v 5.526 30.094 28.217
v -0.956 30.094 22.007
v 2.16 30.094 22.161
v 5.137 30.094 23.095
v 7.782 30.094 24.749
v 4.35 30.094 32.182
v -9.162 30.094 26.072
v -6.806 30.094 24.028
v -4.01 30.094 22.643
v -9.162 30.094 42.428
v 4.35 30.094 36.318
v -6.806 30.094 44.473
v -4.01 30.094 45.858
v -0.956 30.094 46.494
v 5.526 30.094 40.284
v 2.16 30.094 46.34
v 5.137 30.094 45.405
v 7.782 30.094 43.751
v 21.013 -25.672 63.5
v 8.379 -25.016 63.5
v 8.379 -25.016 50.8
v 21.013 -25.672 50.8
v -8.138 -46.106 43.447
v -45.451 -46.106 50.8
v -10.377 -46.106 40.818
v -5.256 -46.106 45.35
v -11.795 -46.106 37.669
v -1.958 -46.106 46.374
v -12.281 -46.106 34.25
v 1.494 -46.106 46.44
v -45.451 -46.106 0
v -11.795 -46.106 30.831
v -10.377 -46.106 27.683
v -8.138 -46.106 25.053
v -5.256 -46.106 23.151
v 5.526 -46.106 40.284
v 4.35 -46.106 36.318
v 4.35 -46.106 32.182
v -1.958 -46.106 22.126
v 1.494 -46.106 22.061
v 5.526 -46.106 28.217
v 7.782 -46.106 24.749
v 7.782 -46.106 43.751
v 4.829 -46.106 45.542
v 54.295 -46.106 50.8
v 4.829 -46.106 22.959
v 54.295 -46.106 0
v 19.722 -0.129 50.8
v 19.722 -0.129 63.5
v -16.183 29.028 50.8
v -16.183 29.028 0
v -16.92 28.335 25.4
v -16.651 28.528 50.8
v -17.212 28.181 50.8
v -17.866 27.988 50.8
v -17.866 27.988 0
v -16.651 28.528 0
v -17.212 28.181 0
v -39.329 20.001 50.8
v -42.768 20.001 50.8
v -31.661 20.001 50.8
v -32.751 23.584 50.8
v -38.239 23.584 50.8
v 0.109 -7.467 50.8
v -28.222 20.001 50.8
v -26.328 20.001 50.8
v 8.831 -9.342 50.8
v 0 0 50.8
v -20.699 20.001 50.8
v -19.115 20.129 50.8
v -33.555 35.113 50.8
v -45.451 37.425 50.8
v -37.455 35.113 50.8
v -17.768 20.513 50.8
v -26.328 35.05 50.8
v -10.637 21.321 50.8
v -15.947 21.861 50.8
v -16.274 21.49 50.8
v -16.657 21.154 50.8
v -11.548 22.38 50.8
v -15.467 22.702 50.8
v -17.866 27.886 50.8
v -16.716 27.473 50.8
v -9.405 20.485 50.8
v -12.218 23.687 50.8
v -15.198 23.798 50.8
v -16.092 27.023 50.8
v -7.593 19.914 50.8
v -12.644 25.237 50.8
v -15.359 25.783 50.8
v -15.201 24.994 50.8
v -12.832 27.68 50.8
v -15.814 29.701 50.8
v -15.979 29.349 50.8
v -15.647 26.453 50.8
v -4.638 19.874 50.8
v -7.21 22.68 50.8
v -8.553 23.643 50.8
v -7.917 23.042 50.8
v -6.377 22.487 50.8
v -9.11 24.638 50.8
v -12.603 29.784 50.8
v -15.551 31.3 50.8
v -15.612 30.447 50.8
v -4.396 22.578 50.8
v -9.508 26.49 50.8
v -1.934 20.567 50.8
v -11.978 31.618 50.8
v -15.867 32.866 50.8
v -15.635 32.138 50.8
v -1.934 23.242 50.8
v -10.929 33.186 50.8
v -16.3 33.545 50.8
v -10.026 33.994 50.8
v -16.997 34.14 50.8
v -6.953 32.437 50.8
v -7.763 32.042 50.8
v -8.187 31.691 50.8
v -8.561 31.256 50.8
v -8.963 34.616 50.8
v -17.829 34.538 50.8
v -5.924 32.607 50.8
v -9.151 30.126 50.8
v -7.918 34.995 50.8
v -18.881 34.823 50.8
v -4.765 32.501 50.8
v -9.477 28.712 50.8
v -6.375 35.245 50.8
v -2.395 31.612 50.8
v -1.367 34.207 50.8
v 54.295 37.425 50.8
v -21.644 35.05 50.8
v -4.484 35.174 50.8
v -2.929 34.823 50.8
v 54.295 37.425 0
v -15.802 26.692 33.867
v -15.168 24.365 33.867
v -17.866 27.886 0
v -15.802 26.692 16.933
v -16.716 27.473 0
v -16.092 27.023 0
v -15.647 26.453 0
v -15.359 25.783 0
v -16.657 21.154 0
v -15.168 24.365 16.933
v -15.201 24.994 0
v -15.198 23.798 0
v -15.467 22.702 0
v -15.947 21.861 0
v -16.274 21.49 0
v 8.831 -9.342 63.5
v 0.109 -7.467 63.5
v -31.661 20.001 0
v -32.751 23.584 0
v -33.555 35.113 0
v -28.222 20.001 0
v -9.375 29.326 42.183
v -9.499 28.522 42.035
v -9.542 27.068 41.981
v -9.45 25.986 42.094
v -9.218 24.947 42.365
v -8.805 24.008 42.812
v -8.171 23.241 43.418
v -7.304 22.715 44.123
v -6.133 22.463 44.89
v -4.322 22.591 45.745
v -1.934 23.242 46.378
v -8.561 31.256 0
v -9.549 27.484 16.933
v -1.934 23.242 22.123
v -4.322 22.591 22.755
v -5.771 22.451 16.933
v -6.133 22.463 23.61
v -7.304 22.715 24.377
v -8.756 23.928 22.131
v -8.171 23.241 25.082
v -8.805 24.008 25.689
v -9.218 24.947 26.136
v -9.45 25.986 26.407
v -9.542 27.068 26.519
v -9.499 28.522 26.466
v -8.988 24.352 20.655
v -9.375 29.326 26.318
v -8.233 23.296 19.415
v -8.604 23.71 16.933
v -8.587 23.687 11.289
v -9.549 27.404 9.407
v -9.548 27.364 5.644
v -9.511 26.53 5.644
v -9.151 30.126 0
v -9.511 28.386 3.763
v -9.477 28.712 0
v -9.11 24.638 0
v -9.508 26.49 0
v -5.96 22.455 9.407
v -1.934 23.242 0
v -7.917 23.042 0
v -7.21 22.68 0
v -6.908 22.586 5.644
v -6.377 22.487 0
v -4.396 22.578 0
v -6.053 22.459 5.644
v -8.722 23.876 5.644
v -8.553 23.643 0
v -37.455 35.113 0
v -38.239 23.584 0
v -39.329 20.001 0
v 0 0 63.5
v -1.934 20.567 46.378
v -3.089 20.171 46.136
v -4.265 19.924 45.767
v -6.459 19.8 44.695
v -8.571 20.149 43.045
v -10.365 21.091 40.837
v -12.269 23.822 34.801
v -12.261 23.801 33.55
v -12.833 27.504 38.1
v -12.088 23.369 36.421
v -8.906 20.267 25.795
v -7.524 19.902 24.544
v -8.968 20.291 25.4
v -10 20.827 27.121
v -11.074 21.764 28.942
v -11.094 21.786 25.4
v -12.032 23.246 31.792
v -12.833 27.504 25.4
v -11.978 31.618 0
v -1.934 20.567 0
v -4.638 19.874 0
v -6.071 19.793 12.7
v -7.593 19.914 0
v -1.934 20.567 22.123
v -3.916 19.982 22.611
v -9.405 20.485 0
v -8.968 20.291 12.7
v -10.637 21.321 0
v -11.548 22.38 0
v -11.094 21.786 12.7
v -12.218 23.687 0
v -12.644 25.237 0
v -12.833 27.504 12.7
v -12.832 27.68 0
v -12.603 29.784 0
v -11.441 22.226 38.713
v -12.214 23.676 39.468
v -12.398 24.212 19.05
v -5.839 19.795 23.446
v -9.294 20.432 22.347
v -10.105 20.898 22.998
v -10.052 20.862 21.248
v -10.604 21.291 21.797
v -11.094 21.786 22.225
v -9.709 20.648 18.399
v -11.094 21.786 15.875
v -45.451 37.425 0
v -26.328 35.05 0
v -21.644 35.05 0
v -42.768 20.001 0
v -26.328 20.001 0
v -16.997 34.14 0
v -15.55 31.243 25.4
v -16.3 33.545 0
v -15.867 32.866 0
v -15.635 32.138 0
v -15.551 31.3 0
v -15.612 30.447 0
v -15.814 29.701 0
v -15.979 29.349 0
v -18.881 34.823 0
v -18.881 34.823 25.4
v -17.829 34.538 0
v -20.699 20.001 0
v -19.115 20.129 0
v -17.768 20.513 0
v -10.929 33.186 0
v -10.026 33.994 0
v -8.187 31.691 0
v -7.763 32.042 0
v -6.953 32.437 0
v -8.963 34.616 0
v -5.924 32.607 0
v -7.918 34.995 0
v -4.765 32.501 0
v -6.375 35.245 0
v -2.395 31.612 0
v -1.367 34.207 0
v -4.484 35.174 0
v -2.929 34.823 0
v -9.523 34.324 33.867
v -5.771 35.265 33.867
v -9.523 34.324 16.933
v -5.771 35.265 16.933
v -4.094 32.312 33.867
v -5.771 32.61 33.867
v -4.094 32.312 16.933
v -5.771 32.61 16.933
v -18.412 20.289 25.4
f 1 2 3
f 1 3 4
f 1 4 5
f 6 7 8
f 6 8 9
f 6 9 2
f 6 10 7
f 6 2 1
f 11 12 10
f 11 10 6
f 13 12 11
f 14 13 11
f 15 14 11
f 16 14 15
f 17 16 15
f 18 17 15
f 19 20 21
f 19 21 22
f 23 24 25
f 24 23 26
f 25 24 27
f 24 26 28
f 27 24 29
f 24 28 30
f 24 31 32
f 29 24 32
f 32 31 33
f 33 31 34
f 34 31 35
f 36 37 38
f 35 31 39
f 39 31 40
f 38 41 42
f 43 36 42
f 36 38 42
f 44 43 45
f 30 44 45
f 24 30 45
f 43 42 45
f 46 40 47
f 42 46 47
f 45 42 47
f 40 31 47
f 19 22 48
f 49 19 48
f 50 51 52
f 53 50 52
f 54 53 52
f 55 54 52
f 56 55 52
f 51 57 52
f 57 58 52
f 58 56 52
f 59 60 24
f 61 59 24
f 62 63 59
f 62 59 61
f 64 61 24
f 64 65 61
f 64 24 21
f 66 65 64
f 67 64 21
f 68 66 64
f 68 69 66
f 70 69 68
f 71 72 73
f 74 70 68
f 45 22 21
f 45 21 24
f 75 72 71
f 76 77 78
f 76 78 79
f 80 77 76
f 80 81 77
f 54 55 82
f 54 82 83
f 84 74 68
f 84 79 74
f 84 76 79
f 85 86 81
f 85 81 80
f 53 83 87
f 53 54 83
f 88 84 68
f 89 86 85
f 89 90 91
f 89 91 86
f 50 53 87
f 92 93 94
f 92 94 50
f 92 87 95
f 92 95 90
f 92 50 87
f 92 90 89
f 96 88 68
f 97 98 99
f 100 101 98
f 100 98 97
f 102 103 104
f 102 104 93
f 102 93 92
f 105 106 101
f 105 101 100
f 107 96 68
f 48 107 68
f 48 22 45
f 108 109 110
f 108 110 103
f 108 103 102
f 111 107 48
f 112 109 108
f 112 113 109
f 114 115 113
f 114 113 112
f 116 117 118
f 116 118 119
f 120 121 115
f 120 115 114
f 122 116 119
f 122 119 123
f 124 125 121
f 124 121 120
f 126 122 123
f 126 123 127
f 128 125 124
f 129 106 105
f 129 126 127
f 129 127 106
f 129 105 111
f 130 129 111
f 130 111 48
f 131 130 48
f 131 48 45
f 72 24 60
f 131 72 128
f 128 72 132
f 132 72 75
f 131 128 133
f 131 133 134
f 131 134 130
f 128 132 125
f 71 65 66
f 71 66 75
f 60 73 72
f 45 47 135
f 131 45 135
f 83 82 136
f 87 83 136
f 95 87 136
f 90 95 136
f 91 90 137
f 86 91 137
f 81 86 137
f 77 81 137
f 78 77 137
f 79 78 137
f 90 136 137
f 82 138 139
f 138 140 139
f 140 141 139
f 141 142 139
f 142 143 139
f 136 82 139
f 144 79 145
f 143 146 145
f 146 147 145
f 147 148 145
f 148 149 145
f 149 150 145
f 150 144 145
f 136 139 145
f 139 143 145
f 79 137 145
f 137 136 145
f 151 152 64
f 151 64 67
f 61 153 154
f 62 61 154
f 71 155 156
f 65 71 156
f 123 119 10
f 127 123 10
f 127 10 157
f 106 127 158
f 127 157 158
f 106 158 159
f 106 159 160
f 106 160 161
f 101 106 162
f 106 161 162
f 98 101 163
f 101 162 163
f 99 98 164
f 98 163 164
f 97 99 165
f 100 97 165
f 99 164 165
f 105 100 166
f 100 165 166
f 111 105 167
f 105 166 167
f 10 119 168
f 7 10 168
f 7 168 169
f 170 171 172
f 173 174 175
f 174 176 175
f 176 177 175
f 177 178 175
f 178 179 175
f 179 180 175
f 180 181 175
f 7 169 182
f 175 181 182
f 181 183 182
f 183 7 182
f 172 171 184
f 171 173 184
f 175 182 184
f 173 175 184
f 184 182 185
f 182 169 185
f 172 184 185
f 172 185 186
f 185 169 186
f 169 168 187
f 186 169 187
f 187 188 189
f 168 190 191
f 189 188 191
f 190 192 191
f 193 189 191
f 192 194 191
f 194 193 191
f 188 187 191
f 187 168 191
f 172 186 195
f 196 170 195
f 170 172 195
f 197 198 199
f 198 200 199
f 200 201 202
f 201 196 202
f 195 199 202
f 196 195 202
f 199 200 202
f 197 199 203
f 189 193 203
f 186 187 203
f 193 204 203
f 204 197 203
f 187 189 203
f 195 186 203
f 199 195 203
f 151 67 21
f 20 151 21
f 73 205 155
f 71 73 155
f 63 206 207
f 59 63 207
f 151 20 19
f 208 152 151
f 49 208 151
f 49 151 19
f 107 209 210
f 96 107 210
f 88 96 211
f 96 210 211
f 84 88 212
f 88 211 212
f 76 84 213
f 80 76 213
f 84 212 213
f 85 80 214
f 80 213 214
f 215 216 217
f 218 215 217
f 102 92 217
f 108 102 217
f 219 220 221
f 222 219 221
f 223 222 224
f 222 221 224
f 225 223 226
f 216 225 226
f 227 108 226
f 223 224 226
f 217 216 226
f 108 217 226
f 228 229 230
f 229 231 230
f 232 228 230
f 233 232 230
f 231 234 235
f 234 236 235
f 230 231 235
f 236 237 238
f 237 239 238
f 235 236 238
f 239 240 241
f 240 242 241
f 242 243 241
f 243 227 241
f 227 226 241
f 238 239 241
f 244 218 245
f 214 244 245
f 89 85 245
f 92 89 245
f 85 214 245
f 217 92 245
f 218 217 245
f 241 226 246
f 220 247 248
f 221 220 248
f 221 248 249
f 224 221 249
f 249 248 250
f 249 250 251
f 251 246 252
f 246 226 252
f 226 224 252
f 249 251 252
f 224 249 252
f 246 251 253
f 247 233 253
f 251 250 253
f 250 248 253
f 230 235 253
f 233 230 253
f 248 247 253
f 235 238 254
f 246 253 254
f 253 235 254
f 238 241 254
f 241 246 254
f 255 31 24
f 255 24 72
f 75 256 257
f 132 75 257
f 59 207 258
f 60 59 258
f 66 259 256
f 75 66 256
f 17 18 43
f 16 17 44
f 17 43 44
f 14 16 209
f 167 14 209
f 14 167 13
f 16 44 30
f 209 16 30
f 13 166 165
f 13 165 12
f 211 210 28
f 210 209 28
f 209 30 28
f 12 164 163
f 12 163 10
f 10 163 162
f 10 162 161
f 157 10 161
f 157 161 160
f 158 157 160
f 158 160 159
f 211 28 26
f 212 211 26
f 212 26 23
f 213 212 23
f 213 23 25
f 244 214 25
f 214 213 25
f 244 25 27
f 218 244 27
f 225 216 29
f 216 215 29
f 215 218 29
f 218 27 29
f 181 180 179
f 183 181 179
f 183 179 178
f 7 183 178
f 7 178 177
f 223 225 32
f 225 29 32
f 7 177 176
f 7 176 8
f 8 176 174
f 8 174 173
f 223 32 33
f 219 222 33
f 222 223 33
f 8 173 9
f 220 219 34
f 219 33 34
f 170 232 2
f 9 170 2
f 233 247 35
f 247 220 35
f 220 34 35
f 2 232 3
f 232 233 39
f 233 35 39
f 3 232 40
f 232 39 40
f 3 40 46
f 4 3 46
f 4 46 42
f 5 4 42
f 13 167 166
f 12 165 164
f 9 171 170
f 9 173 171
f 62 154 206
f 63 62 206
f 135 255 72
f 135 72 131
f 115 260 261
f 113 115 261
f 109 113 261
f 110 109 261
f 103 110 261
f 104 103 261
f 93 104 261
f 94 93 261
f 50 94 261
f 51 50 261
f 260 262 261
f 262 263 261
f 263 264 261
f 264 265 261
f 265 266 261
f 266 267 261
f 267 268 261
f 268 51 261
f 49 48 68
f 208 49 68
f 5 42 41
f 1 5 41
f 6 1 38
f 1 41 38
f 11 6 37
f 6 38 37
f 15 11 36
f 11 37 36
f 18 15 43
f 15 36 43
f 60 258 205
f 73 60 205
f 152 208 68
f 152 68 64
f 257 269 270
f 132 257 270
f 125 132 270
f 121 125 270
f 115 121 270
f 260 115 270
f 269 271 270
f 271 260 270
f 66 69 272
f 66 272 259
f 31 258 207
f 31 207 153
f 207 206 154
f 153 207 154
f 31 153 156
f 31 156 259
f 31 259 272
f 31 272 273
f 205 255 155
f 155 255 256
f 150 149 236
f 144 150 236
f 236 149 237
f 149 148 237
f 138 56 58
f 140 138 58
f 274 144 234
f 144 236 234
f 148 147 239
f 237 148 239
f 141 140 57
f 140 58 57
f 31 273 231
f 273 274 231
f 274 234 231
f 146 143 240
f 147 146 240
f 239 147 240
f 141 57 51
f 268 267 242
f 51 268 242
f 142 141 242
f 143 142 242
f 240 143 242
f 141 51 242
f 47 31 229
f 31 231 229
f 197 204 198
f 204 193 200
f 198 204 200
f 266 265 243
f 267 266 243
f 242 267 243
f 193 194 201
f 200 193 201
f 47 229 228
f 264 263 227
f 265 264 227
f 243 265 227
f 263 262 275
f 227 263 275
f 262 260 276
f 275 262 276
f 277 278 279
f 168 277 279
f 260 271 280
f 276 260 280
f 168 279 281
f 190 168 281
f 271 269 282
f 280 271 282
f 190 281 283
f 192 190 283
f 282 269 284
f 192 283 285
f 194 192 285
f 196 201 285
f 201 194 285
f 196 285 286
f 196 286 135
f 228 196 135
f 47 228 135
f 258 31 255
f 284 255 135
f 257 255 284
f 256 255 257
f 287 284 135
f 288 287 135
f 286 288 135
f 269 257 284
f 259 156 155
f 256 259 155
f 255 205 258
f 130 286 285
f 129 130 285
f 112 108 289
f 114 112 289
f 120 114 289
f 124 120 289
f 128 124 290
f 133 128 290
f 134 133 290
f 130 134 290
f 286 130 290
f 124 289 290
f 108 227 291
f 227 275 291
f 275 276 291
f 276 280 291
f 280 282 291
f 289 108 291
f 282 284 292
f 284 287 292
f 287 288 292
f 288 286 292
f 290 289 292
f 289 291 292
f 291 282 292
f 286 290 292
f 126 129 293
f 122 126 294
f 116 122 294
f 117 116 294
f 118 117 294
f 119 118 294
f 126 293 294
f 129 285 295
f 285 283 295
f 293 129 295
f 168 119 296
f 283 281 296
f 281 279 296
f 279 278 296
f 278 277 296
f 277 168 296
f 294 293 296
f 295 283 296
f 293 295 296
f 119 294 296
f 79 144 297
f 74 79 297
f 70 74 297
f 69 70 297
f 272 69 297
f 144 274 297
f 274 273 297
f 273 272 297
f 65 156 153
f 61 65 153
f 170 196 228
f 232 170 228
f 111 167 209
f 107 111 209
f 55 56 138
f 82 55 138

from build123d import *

# Parameters (mm, degrees)
F0_W     = 99.7463464737
F0_H     = 83.5314244032
F1_DEPTH = 50.8
F3_DEPTH = 76.2
F5_DEPTH = 12.7


with BuildPart() as f1:
    # F0 (on Top) → F1 (new body)
    with BuildSketch(Plane.XY):
        with Locations((4.4222511351, -4.3403580785)):
            Rectangle(F0_W, F0_H)
        Polygon((-28.2221282138, 20.0006692662), (-31.6609589625, 20.0006692662), (-32.7512395926, 23.5844315791), (-38.2388756342, 23.5844315791), (-39.3291562643, 20.0006692662), (-42.767987013, 20.0006692662), (-37.4549276283, 35.1130787253), (-33.5549509937, 35.1130787253), align=None, mode=Mode.SUBTRACT)
        with BuildLine():
            Line((-26.3281361826, 20.0006692662), (-26.3281361826, 35.0504946407))
            Line((-26.3281361826, 35.0504946407), (-21.6442115421, 35.0504946407))
            add(Edge.make_bspline(
                [(-21.6442115421, 35.0504946407), (-18.4425415347, 35.0504946407), (-16.9965197926, 34.1397315162)],
                knots=[0, 0, 0, 1, 1, 1], degree=2))
            add(Edge.make_bspline(
                [(-16.9965197926, 34.1397315162), (-15.5504980506, 33.2289683917), (-15.5504980506, 31.2427471833)],
                knots=[0, 0, 0, 1, 1, 1], degree=2))
            add(Edge.make_bspline(
                [(-15.5504980506, 31.2427471833), (-15.5504980506, 29.8922485176), (-16.182926694, 29.0275999817)],
                knots=[0, 0, 0, 1, 1, 1], degree=2))
            add(Edge.make_bspline(
                [(-16.182926694, 29.0275999817), (-16.8153553375, 28.1629514457), (-17.8661091773, 27.9883747889)],
                knots=[0, 0, 0, 1, 1, 1], degree=2))
            Line((-17.8661091773, 27.9883747889), (-17.8661091773, 27.8862639142))
            add(Edge.make_bspline(
                [(-17.8661091773, 27.8862639142), (-16.4365569312, 27.5667556933), (-15.8024813382, 26.6922254598)],
                knots=[0, 0, 0, 1, 1, 1], degree=2))
            add(Edge.make_bspline(
                [(-15.8024813382, 26.6922254598), (-15.1684057452, 25.8176952263), (-15.1684057452, 24.3650856859)],
                knots=[0, 0, 0, 1, 1, 1], degree=2))
            add(Edge.make_bspline(
                [(-15.1684057452, 24.3650856859), (-15.1684057452, 22.3063986955), (-16.6572481766, 21.1535339809)],
                knots=[0, 0, 0, 1, 1, 1], degree=2))
            add(Edge.make_bspline(
                [(-16.6572481766, 21.1535339809), (-18.146090608, 20.0006692662), (-20.6988624761, 20.0006692662)],
                knots=[0, 0, 0, 1, 1, 1], degree=2))
            Line((-20.6988624761, 20.0006692662), (-26.3281361826, 20.0006692662))
        make_face(mode=Mode.SUBTRACT)
        with BuildLine():
            add(Edge.make_bspline(
                [(-4.0943166865, 32.3116174687), (-4.9474365753, 32.6097153449), (-5.7709113714, 32.6097153449)],
                knots=[0, 0, 0, 1, 1, 1], degree=2))
            add(Edge.make_bspline(
                [(-5.7709113714, 32.6097153449), (-7.5726742254, 32.6097153449), (-8.5608439808, 31.2559227801)],
                knots=[0, 0, 0, 1, 1, 1], degree=2))
            add(Edge.make_bspline(
                [(-8.5608439808, 31.2559227801), (-9.5490137362, 29.9021302152), (-9.5490137362, 27.4844082137)],
                knots=[0, 0, 0, 1, 1, 1], degree=2))
            add(Edge.make_bspline(
                [(-9.5490137362, 27.4844082137), (-9.5490137362, 22.4513302596), (-5.7709113714, 22.4513302596)],
                knots=[0, 0, 0, 1, 1, 1], degree=2))
            add(Edge.make_bspline(
                [(-5.7709113714, 22.4513302596), (-4.1865458636, 22.4513302596), (-1.9335188214, 23.2418660639)],
                knots=[0, 0, 0, 1, 1, 1], degree=2))
            Line((-1.9335188214, 23.2418660639), (-1.9335188214, 20.567219926))
            add(Edge.make_bspline(
                [(-1.9335188214, 20.567219926), (-3.7846901631, 19.7931536176), (-6.0706561972, 19.7931536176)],
                knots=[0, 0, 0, 1, 1, 1], degree=2))
            add(Edge.make_bspline(
                [(-6.0706561972, 19.7931536176), (-9.3546736843, 19.7931536176), (-11.0938524538, 21.7859626243)],
                knots=[0, 0, 0, 1, 1, 1], degree=2))
            add(Edge.make_bspline(
                [(-11.0938524538, 21.7859626243), (-12.8330312233, 23.778771631), (-12.8330312233, 27.5041716088)],
                knots=[0, 0, 0, 1, 1, 1], degree=2))
            add(Edge.make_bspline(
                [(-12.8330312233, 27.5041716088), (-12.8330312233, 29.8527217274), (-11.9782643849, 31.6182516904)],
                knots=[0, 0, 0, 1, 1, 1], degree=2))
            add(Edge.make_bspline(
                [(-11.9782643849, 31.6182516904), (-11.1234975464, 33.3837816533), (-9.5226625427, 34.3241898705)],
                knots=[0, 0, 0, 1, 1, 1], degree=2))
            add(Edge.make_bspline(
                [(-9.5226625427, 34.3241898705), (-7.921827539, 35.2645980877), (-5.7709113714, 35.2645980877)],
                knots=[0, 0, 0, 1, 1, 1], degree=2))
            add(Edge.make_bspline(
                [(-5.7709113714, 35.2645980877), (-3.5804684137, 35.2645980877), (-1.3669681616, 34.2072564495)],
                knots=[0, 0, 0, 1, 1, 1], degree=2))
            Line((-1.3669681616, 34.2072564495), (-2.3946647072, 31.611663892))
            add(Edge.make_bspline(
                [(-2.3946647072, 31.611663892), (-3.2411967977, 32.0135195925), (-4.0943166865, 32.3116174687)],
                knots=[0, 0, 0, 1, 1, 1], degree=2))
        make_face(mode=Mode.SUBTRACT)
    extrude(amount=F1_DEPTH)

    # F2 (on face) → F3 (cut)
    with BuildSketch(Plane.XZ.offset(46.1060702801)):
        with BuildLine():
            ThreePointArc((7.7817309512, 24.7494648312), (4.2001656167, 34.2502631247), (7.7817309512, 43.7510614182))
            ThreePointArc((7.7817309512, 43.7510614182), (-12.2809, 34.2502631247), (7.7817309512, 24.7494648312))
        make_face()
    extrude(amount=-F3_DEPTH, mode=Mode.SUBTRACT)

    # F4 (on face) → F5 (join)
    with BuildSketch(Plane.XY.offset(50.8)):
        Polygon((19.7219643742, -0.1289248466), (0, 0), (0.1093503088, -7.4666291475), (8.8314060122, -9.341686964), (8.3788465708, -25.0158682466), (21.0125762969, -25.6724208593), align=None)
    extrude(amount=F5_DEPTH)


solid = f1.part
